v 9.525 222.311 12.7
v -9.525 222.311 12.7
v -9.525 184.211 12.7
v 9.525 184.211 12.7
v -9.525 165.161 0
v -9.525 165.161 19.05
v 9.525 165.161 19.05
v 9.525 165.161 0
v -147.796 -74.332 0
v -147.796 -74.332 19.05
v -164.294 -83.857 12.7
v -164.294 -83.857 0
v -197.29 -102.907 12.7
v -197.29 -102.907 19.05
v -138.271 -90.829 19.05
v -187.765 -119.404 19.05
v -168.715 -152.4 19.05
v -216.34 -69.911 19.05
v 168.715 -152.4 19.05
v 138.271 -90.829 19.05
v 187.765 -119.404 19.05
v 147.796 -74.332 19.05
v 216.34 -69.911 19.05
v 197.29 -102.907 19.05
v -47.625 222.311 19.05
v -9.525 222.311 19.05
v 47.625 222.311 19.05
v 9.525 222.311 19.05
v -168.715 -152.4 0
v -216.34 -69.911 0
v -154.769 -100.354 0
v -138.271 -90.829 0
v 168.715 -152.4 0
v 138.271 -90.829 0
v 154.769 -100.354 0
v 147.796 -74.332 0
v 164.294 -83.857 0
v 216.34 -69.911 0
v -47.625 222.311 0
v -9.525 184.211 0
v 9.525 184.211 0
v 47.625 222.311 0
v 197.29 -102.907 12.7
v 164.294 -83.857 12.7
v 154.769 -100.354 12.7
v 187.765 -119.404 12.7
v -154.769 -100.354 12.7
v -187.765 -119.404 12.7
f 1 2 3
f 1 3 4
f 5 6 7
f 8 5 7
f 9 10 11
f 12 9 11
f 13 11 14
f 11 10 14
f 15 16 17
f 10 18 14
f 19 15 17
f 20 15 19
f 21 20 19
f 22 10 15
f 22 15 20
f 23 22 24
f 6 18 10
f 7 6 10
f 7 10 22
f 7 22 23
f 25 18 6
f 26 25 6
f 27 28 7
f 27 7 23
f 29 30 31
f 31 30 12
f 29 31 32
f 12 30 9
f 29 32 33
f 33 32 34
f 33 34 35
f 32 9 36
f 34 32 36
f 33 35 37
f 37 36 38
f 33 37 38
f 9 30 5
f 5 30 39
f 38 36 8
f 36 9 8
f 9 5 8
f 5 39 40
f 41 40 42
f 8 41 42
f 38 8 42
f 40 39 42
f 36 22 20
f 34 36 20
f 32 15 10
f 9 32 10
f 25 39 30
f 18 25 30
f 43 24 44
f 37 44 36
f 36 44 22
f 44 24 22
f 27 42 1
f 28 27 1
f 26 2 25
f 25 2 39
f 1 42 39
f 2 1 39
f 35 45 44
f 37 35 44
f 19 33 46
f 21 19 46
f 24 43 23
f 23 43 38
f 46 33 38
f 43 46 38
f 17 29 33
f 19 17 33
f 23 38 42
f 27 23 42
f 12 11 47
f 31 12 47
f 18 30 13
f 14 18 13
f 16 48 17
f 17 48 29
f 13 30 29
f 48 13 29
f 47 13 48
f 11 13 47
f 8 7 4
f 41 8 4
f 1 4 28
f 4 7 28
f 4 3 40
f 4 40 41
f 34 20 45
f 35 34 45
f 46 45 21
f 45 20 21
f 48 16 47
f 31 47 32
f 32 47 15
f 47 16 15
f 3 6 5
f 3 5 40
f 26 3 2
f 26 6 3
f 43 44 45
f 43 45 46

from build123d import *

# Parameters (mm, degrees)
F1_DEPTH = 19.05
F2_W     = 19.05
F2_H     = 19.05
F3_DEPTH = 19.05
F4_W     = 19.05
F4_H     = 38.1
F5_DEPTH = 6.35


with BuildPart() as f1:
    # F0 (on Top) → F1 (new body)
    with BuildSketch(Plane.XY):
        Polygon((47.625, 222.31108), (-47.625, 222.31108), (-216.339543, -69.91108), (-168.714543, -152.4), (168.714543, -152.4), (216.339543, -69.91108), align=None)
    extrude(amount=F1_DEPTH)

    # F2 (on face) → F3 (cut, through all)
    with BuildSketch(Plane.XY.offset(19.05)):
        with Locations((0, 174.68608)):
            Rectangle(F2_W, F2_H)
        Polygon((154.768975, -100.354432), (164.293975, -83.856648), (147.796191, -74.331648), (138.271191, -90.829432), align=None)
        Polygon((-164.293975, -83.856648), (-154.768975, -100.354432), (-138.271191, -90.829432), (-147.796191, -74.331648), align=None)
    extrude(amount=-F3_DEPTH, mode=Mode.SUBTRACT)

    # F4 (on face) → F5 (cut)
    with BuildSketch(Plane.XY.offset(19.05)):
        Polygon((-154.768975, -100.354432), (-164.293975, -83.856648), (-197.289543, -102.906648), (-187.764543, -119.404432), align=None)
        Polygon((197.289543, -102.906648), (164.293975, -83.856648), (154.768975, -100.354432), (187.764543, -119.404432), align=None)
        with Locations((0, 203.26108)):
            Rectangle(F4_W, F4_H)
    extrude(amount=-F5_DEPTH, mode=Mode.SUBTRACT)


solid = f1.part
